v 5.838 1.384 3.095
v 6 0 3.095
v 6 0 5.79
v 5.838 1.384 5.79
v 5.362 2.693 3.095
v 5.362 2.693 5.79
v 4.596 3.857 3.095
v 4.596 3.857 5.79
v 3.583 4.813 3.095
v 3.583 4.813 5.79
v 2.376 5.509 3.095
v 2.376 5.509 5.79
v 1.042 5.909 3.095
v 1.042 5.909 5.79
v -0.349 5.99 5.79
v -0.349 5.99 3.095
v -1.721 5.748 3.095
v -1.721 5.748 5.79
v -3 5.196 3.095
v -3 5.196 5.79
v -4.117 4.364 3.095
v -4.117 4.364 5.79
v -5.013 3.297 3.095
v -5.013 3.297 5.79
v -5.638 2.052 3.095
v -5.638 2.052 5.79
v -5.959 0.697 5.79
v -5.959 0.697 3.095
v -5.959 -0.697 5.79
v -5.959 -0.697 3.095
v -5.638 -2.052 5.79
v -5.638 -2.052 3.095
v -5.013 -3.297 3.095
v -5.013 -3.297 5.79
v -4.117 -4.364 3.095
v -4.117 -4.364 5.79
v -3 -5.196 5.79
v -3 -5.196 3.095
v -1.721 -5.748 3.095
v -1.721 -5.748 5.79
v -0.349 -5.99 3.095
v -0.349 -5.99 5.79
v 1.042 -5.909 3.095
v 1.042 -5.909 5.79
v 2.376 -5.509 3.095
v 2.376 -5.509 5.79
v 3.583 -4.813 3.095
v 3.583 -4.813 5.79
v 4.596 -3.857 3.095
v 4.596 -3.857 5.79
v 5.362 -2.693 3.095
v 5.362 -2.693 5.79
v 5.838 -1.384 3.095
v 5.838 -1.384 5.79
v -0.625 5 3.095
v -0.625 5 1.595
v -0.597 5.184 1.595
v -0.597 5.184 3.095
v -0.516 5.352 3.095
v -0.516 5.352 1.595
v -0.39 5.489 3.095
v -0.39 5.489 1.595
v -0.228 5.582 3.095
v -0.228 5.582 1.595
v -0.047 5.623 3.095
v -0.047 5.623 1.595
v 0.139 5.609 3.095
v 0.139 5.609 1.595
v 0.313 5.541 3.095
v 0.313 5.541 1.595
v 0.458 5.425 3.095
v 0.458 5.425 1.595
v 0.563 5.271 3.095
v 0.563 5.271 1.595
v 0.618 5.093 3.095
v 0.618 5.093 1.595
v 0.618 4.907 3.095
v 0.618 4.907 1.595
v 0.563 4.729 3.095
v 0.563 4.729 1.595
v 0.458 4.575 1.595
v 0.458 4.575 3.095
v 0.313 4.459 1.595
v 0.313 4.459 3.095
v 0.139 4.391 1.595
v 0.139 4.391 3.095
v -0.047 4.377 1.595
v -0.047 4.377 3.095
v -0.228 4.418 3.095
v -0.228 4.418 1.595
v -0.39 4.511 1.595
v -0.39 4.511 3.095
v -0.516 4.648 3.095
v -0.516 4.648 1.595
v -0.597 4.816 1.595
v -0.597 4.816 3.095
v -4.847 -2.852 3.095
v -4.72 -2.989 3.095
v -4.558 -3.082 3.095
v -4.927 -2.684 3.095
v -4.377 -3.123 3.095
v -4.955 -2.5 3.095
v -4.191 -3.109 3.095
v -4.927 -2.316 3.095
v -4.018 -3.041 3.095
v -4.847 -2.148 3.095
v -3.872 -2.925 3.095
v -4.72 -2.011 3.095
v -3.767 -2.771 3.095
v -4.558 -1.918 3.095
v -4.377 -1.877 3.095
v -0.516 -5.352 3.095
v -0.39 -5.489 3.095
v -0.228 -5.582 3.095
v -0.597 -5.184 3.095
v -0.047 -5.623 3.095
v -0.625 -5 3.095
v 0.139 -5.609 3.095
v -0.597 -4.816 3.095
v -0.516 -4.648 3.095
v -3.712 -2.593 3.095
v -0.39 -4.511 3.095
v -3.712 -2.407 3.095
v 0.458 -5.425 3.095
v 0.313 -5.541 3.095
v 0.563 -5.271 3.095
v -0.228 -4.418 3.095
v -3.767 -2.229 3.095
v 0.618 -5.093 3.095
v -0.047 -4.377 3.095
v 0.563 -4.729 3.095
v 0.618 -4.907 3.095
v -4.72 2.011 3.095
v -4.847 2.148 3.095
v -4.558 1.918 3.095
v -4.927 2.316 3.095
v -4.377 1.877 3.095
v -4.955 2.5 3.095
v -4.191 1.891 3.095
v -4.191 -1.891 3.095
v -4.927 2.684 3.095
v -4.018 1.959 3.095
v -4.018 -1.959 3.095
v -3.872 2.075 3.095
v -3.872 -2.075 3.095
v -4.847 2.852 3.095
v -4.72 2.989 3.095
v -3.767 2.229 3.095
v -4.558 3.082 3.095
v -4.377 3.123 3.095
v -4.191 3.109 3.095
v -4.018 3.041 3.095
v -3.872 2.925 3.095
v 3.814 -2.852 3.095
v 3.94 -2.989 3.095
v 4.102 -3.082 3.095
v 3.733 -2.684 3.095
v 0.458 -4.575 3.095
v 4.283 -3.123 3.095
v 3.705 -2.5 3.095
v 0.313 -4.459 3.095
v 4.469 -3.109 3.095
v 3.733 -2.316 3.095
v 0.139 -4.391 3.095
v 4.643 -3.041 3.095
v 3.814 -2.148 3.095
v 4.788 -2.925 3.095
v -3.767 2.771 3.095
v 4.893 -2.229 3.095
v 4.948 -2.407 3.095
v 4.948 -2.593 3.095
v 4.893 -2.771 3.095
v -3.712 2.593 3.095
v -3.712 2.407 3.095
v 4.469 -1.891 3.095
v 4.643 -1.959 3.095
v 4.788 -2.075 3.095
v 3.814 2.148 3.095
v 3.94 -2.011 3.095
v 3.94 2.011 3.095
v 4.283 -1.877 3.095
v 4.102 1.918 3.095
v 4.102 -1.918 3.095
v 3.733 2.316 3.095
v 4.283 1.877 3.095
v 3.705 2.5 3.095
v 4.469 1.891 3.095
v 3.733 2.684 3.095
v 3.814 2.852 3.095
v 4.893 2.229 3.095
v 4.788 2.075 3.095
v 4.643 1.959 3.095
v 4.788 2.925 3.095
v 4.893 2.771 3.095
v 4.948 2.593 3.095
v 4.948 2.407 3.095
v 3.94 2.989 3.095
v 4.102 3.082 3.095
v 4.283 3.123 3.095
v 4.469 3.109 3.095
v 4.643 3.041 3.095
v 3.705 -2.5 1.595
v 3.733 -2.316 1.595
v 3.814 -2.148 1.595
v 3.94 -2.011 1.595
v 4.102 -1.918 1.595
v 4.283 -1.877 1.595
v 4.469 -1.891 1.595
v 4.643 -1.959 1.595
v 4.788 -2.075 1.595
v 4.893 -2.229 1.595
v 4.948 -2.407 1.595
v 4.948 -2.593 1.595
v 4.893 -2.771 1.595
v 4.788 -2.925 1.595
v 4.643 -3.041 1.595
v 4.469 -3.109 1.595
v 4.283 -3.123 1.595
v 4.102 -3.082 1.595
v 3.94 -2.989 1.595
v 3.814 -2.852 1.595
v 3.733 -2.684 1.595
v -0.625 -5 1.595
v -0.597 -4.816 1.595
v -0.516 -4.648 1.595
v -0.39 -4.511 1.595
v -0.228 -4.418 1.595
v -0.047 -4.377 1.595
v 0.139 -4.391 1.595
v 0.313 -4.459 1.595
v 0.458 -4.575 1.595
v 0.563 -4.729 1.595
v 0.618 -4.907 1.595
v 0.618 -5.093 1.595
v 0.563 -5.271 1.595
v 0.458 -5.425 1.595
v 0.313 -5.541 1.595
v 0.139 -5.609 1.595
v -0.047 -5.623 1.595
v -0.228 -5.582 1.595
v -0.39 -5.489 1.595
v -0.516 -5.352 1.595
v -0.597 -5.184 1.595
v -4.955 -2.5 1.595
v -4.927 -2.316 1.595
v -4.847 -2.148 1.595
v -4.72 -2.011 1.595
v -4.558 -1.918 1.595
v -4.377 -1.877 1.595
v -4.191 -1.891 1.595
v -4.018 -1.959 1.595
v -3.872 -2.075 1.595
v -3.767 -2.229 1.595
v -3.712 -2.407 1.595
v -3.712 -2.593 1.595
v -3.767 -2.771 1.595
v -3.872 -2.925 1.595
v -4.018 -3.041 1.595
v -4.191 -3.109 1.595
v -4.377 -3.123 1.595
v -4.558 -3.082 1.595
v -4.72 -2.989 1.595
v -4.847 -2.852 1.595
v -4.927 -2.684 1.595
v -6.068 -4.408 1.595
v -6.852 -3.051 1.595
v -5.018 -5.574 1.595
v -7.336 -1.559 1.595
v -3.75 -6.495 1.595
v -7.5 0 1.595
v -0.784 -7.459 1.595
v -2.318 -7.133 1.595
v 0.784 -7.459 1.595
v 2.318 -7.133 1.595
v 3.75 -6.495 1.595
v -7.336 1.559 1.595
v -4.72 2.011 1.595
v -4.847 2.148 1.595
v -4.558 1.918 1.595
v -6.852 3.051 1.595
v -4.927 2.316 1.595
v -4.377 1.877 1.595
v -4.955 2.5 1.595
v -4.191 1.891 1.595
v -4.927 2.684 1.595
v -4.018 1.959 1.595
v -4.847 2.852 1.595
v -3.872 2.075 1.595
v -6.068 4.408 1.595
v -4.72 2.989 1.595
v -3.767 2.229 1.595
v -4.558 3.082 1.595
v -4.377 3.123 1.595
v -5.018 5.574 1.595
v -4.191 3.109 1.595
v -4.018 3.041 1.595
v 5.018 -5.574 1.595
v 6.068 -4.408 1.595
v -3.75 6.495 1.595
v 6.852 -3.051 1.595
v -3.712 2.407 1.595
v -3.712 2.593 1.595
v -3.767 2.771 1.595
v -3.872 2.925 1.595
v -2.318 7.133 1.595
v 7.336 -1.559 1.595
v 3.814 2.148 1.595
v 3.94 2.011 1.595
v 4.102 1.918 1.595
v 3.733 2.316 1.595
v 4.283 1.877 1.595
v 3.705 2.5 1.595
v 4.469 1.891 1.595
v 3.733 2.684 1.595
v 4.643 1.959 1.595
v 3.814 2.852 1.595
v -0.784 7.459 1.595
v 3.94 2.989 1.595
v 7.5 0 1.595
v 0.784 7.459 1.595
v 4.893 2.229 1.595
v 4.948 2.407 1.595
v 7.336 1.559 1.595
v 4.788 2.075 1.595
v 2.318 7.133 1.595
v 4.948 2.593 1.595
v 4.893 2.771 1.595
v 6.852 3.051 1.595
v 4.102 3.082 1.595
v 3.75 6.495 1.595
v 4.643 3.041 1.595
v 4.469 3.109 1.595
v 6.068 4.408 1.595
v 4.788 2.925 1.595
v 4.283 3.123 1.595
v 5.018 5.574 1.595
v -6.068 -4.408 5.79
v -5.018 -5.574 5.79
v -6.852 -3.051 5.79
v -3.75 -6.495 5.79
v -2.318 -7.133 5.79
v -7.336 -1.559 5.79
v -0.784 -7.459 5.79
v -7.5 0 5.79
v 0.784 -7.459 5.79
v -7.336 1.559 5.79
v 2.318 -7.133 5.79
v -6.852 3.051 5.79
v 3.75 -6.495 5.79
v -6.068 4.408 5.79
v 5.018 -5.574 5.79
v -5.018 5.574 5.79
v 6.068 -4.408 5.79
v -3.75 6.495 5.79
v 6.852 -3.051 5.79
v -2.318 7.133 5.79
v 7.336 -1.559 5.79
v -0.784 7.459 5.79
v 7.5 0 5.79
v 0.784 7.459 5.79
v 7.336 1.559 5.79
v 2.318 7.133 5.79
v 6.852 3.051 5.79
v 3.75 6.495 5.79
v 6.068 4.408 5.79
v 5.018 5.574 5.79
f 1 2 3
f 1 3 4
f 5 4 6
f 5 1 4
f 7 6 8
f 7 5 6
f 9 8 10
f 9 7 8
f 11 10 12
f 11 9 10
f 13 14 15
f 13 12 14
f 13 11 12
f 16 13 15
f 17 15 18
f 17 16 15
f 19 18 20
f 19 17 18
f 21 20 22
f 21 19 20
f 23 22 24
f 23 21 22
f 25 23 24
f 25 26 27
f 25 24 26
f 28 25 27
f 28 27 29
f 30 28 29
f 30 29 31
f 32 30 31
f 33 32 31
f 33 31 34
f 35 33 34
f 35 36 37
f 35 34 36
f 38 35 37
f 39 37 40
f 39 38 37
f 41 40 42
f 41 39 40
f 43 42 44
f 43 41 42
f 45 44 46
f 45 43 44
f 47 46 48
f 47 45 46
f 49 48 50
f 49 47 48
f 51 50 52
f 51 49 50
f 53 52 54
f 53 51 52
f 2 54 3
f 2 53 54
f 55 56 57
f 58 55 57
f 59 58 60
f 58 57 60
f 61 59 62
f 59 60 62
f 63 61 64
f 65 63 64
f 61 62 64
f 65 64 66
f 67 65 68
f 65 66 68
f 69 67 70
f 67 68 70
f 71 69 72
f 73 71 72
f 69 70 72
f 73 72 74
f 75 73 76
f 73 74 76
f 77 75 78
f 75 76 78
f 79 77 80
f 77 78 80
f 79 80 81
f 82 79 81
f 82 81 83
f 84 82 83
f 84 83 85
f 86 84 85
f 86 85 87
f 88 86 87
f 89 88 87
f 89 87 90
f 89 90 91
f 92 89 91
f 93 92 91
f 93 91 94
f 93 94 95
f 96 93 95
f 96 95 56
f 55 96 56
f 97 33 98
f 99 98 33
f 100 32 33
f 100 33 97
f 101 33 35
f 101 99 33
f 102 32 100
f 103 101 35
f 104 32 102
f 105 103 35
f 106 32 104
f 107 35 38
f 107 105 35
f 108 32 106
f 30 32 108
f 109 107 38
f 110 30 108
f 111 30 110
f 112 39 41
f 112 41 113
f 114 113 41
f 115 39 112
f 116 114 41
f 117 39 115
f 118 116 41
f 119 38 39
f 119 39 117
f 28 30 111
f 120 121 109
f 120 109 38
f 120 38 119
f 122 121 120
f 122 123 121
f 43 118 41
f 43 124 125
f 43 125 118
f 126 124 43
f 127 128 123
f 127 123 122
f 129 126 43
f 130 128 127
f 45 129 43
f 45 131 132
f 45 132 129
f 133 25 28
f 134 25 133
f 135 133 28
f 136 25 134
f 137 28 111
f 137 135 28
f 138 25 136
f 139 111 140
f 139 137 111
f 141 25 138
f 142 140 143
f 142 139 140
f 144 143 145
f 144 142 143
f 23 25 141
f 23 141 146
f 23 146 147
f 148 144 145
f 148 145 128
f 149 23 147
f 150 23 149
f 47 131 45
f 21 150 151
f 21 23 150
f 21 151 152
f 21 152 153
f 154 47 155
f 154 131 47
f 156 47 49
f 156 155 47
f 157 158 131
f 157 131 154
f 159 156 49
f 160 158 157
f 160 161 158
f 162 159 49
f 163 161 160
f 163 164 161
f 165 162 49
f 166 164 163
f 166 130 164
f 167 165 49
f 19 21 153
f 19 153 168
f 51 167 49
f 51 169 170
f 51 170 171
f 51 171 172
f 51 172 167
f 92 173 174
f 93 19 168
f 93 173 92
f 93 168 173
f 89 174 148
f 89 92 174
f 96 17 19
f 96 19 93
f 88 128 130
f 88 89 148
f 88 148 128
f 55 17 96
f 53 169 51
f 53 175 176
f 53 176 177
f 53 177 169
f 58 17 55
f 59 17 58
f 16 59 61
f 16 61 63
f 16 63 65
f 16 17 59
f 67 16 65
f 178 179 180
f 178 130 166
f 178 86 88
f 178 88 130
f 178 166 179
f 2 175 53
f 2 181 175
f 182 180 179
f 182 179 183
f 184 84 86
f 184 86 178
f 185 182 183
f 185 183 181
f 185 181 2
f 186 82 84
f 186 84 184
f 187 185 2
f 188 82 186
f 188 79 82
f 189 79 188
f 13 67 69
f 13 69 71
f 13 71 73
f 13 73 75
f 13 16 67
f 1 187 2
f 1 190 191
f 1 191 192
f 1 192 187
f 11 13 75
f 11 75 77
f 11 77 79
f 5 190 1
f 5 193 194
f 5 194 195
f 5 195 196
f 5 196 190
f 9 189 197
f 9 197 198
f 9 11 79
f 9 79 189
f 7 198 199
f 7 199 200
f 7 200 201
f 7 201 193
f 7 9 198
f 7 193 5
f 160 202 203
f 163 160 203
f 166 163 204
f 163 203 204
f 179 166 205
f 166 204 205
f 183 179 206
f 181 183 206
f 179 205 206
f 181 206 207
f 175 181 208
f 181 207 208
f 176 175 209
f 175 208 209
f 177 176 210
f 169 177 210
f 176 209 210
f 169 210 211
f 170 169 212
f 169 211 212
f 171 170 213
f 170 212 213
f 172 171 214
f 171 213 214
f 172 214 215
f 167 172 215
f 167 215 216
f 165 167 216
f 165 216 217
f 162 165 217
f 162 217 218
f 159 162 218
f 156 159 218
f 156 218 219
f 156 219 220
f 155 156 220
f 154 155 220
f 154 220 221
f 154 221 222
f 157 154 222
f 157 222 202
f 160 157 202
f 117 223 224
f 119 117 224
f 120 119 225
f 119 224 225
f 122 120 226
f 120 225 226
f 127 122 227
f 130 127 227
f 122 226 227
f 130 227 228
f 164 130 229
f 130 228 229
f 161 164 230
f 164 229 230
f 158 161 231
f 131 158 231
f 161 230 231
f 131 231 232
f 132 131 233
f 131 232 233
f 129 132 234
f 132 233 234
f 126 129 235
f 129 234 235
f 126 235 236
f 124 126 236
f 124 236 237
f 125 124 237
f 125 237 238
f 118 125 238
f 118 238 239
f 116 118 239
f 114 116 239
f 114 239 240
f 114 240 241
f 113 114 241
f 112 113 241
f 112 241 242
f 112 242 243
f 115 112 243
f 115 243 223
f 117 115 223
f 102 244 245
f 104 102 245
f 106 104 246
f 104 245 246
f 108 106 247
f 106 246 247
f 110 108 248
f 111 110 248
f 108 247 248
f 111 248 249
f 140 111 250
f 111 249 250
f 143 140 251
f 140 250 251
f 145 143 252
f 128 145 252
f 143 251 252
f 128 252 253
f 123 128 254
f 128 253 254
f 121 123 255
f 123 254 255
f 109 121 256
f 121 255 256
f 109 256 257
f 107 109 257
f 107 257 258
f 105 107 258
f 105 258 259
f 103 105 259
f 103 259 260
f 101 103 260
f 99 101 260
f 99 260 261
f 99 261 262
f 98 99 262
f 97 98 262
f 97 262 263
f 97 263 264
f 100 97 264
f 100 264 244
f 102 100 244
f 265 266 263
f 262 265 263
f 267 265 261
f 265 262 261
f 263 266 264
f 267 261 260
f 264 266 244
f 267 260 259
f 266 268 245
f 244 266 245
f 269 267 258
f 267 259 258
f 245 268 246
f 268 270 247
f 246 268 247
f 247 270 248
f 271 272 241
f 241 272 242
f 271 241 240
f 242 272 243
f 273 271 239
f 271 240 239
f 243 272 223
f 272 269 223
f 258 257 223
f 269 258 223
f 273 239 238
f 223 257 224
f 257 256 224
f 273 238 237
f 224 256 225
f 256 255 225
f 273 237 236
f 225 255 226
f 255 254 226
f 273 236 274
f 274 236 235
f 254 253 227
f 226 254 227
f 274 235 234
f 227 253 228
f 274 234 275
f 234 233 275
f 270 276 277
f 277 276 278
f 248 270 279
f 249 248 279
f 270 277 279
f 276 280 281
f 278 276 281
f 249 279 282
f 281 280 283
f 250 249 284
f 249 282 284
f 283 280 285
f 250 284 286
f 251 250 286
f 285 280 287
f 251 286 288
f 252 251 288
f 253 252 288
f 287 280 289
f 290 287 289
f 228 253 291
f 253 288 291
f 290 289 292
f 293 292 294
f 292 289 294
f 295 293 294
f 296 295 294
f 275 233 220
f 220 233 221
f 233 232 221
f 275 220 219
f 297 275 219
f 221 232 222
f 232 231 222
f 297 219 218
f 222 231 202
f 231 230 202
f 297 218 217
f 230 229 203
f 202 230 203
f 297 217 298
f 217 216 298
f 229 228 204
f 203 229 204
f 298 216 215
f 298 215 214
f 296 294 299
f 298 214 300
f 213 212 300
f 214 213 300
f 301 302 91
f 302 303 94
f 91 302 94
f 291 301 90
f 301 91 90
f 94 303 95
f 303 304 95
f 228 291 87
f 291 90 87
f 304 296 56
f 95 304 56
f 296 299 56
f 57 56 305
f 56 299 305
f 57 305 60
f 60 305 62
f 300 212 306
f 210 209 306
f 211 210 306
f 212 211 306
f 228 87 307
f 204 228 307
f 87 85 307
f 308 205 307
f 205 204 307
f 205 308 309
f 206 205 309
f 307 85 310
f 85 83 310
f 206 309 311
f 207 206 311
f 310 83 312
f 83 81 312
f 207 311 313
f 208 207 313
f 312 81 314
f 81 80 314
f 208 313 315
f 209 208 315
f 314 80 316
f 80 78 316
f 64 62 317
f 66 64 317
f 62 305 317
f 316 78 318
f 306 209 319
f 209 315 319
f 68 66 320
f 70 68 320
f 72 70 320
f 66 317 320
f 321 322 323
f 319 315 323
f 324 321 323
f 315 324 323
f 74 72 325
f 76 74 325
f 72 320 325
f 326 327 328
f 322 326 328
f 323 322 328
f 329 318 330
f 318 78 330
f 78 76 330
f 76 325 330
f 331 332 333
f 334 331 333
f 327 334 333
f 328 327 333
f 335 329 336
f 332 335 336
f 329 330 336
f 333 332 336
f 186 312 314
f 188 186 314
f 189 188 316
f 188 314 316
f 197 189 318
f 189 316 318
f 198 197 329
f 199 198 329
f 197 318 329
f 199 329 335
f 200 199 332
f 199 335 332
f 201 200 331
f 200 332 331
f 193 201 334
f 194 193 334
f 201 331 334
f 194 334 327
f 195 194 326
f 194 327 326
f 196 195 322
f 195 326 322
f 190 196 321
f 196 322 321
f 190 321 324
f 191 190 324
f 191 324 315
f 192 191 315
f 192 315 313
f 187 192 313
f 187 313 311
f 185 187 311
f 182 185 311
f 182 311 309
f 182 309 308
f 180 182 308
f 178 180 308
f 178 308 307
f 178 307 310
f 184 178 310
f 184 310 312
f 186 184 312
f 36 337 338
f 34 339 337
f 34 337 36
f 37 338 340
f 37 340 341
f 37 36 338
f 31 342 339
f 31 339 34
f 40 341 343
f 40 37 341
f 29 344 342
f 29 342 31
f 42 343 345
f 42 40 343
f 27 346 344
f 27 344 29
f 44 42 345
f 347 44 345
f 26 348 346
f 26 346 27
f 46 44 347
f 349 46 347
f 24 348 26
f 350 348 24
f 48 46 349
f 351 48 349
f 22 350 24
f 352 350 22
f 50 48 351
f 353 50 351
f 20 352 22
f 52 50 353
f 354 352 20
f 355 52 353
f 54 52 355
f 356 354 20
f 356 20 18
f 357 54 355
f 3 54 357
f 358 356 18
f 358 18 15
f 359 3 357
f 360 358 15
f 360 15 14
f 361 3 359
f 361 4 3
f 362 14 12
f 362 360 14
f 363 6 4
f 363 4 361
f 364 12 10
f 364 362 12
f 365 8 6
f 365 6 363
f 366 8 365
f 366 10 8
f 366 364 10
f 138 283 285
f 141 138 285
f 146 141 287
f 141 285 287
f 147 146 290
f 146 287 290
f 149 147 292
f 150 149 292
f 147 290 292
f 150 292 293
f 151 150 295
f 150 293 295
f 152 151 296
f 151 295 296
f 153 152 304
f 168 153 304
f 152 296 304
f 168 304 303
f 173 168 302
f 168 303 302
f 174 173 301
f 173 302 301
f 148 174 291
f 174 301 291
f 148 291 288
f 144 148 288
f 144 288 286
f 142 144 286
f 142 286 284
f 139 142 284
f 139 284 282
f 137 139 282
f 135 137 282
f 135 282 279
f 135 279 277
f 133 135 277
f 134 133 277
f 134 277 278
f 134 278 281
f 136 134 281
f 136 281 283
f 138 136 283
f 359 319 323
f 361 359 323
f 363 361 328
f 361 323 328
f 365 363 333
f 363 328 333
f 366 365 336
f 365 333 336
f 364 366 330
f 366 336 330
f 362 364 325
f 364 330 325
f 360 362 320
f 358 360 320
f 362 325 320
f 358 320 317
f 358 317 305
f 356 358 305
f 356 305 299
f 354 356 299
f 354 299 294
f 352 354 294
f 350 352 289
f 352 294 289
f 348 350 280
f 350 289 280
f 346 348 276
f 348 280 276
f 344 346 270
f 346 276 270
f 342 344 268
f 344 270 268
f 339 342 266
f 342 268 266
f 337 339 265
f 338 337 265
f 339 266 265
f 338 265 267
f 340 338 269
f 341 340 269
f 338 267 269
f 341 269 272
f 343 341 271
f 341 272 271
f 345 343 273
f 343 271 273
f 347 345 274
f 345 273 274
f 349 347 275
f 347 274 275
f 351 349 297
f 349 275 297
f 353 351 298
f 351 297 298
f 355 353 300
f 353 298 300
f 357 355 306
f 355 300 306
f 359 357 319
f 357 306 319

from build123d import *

# Parameters (mm, degrees)
SKETCH2_R           = 15
BOSS_EXTRUDE1_DEPTH = 8.39
SHELL1_T            = -3
SKETCH3_R           = 1.25
CUT_EXTRUDE1_DEPTH  = 5
SCALE1_SCALE        = 0.5


with BuildPart() as part:
    # Sketch2 → Boss-Extrude1 (new body)
    with BuildSketch(Plane.XY):
        Circle(SKETCH2_R)
    extrude(amount=BOSS_EXTRUDE1_DEPTH)

    # Shell1
    shell1_openings = [part.faces().sort_by_distance(p)[0] for p in [
        (0, 0, 8.39),
    ]]
    offset(amount=SHELL1_T, openings=shell1_openings, kind=Kind.INTERSECTION)

    # Sketch3 → Cut-Extrude1 (cut)
    with BuildSketch(Plane(origin=(0, 0, 0), x_dir=(-1, 0, 0), z_dir=(0, 0, -1))):
        with Locations((0, 10)):
            Circle(SKETCH3_R)
        with Locations((8.660254038, 5)):
            Circle(SKETCH3_R)
        with Locations((8.660254038, -5)):
            Circle(SKETCH3_R)
        with Locations((0, -10)):
            Circle(SKETCH3_R)
        with Locations((-8.660254038, -5)):
            Circle(SKETCH3_R)
        with Locations((-8.660254038, 5)):
            Circle(SKETCH3_R)
    extrude(amount=-CUT_EXTRUDE1_DEPTH, mode=Mode.SUBTRACT)


with BuildPart() as part_1:
    # Scale1: scaled about (0, 0, 3.190405366)
    add(part.part.scale(SCALE1_SCALE).moved(Location((0, 0, 1.595202683))))


solid = part_1.part
